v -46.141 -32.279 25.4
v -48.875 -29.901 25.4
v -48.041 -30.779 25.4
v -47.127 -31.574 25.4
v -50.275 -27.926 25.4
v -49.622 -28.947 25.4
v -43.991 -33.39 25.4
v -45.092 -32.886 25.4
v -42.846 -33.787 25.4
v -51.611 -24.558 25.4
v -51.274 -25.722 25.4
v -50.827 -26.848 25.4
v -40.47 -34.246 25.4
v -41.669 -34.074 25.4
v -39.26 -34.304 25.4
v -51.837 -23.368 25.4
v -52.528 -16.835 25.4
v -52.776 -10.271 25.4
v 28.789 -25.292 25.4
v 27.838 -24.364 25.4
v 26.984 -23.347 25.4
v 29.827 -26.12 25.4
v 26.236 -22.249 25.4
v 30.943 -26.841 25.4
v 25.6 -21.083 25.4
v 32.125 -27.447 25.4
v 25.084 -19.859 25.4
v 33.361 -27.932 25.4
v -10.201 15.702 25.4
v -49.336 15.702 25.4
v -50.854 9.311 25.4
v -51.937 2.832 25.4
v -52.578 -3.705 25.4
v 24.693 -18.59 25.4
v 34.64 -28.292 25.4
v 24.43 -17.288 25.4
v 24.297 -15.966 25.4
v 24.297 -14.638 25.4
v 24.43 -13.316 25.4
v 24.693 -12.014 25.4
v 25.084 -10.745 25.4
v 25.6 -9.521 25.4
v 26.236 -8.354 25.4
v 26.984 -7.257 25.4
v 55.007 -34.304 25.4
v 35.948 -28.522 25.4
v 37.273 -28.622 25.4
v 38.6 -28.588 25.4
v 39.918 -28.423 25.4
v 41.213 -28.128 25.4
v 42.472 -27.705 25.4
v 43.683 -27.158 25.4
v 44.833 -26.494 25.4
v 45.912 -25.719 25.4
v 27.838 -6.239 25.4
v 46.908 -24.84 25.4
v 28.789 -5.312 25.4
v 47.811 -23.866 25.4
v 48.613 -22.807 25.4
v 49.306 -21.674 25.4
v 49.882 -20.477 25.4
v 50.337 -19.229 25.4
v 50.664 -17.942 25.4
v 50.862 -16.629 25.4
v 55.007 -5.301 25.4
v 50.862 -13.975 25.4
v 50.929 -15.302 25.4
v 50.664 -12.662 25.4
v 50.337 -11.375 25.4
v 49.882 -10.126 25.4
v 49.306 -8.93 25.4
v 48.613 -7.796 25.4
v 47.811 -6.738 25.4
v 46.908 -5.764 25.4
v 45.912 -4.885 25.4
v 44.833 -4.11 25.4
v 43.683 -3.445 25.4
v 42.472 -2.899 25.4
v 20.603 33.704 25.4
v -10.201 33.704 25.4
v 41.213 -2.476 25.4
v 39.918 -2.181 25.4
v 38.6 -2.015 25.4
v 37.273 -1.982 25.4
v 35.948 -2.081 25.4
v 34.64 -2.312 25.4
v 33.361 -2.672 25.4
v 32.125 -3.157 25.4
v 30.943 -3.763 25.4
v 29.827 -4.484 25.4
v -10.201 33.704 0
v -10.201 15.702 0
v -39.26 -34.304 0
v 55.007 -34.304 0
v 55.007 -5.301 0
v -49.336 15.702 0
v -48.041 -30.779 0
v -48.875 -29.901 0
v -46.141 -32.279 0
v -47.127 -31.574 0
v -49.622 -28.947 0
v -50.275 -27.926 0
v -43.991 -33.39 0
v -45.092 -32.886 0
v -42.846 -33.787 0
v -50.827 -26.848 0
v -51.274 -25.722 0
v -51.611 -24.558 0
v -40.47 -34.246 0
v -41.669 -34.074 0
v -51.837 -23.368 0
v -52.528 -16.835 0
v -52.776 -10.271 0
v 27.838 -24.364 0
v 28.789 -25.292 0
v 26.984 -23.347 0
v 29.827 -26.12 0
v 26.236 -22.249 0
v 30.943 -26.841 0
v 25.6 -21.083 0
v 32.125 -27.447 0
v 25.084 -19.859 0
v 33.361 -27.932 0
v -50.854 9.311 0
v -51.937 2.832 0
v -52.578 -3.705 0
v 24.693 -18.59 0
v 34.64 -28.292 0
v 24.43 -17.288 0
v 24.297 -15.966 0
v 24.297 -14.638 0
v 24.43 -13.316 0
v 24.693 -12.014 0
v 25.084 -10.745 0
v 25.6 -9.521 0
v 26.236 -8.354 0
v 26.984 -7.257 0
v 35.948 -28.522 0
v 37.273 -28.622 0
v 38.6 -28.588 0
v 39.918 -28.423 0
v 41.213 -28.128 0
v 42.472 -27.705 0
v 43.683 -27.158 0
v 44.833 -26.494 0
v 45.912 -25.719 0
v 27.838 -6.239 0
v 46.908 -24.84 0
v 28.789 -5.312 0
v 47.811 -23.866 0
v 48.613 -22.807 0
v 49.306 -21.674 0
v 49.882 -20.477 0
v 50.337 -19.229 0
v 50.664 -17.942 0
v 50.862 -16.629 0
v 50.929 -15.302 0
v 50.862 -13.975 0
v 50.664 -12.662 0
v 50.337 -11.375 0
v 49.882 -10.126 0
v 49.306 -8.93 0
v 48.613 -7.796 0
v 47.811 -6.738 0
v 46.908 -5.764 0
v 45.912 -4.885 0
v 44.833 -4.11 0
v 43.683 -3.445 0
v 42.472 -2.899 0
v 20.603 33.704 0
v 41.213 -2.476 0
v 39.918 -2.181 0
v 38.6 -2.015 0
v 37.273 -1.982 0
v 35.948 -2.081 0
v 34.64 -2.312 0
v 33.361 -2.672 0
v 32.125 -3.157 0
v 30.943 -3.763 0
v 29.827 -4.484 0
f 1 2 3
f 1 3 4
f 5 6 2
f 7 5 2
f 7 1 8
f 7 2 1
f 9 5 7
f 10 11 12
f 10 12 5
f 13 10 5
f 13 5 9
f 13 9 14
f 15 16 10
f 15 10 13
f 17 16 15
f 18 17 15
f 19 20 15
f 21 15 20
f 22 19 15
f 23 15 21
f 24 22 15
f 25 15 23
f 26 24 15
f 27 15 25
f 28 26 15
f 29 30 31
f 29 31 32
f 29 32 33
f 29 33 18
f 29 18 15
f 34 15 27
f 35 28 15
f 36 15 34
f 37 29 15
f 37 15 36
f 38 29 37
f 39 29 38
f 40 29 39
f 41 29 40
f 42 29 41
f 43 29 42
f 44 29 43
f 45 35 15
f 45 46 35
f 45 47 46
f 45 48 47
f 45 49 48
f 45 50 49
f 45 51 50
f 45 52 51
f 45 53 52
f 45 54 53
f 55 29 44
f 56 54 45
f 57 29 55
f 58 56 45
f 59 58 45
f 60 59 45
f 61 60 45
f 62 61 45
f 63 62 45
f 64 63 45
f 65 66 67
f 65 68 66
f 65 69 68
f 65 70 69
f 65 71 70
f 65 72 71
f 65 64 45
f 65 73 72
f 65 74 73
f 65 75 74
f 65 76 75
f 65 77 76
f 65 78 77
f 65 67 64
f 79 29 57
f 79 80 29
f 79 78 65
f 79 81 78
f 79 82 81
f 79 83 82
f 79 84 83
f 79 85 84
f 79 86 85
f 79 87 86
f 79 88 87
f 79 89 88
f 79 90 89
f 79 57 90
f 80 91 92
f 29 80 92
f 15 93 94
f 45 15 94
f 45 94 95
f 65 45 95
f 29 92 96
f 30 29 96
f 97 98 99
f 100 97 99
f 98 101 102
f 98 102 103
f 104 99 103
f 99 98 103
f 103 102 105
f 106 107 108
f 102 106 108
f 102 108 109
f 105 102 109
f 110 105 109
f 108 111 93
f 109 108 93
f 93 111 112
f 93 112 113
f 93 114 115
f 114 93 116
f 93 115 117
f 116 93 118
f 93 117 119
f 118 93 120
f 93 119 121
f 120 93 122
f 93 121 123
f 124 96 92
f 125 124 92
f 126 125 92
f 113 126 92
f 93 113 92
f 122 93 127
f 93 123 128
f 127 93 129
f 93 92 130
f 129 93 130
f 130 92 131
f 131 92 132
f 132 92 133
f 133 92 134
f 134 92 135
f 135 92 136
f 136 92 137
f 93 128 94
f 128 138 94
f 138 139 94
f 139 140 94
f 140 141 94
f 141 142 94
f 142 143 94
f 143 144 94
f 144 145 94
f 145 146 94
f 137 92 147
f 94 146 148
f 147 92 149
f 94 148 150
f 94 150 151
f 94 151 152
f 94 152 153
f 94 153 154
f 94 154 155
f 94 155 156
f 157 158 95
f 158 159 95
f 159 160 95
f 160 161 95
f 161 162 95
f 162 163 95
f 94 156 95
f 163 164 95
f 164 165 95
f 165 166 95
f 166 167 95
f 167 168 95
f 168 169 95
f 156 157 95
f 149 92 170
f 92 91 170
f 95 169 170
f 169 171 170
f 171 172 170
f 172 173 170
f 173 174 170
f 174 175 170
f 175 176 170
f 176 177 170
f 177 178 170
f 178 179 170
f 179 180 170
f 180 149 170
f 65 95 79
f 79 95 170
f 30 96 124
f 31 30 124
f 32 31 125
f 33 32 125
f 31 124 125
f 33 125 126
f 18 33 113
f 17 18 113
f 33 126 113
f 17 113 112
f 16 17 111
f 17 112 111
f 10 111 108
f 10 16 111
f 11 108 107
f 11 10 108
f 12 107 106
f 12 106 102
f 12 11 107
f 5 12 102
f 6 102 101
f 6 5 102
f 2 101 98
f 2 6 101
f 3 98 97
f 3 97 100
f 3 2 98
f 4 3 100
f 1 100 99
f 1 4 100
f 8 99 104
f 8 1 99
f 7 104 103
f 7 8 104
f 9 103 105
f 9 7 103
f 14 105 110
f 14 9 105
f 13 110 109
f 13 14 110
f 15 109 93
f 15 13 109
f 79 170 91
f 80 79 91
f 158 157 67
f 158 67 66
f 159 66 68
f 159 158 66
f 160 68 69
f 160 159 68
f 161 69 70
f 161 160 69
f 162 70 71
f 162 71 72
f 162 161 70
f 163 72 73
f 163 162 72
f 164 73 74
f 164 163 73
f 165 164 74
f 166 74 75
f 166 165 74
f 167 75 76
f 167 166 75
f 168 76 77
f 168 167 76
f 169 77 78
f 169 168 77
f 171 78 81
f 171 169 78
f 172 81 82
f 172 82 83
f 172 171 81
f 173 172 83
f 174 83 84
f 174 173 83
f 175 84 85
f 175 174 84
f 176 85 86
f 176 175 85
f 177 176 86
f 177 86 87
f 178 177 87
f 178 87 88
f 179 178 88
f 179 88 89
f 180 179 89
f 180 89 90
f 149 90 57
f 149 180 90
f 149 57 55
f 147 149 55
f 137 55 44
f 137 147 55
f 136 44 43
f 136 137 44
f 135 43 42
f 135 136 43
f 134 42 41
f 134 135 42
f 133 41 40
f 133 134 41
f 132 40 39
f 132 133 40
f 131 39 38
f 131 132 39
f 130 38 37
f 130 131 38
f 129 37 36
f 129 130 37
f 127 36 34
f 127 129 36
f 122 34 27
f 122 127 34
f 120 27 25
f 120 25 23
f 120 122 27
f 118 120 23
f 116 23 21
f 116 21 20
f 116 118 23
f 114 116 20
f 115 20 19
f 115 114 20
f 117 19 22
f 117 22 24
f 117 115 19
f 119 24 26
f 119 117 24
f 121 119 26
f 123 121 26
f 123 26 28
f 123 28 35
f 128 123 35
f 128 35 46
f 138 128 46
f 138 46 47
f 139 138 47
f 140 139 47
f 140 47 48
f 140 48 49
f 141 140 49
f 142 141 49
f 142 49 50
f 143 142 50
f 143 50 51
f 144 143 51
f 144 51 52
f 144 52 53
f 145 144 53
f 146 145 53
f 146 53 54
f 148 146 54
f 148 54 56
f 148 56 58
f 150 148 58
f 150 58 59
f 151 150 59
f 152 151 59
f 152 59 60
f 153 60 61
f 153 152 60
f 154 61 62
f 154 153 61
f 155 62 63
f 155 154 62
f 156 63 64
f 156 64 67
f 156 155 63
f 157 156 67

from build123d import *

# Parameters (mm, degrees)
F0_R     = 13.323828
F1_DEPTH = 25.4
F2_R     = 12.7


with BuildPart() as f1:
    # F0 (on Top) → F1 (new body)
    with BuildSketch(Plane.XY):
        with BuildLine():
            Line((-10.201276, 15.701963), (-49.335584, 15.701963))
            ThreePointArc((-49.335584, 15.701963), (-52.774252, -9.280166), (-49.655831, -34.304287))
            Line((-49.655831, -34.304287), (55.006877, -34.304287))
            Line((55.006877, -34.304287), (55.006877, -5.300662))
            Line((55.006877, -5.300662), (20.602578, 33.70421))
            Line((20.602578, 33.70421), (-10.201276, 33.70421))
            Line((-10.201276, 33.70421), (-10.201276, 15.701963))
        make_face()
        with Locations((37.604701, -15.301912)):
            Circle(F0_R, mode=Mode.SUBTRACT)
    extrude(amount=F1_DEPTH)

    # F2
    f2_edges = [f1.edges().sort_by_distance(p)[0] for p in [
        (-49.655831, -34.304287, 12.7),
    ]]
    fillet(f2_edges, radius=F2_R)


solid = f1.part
